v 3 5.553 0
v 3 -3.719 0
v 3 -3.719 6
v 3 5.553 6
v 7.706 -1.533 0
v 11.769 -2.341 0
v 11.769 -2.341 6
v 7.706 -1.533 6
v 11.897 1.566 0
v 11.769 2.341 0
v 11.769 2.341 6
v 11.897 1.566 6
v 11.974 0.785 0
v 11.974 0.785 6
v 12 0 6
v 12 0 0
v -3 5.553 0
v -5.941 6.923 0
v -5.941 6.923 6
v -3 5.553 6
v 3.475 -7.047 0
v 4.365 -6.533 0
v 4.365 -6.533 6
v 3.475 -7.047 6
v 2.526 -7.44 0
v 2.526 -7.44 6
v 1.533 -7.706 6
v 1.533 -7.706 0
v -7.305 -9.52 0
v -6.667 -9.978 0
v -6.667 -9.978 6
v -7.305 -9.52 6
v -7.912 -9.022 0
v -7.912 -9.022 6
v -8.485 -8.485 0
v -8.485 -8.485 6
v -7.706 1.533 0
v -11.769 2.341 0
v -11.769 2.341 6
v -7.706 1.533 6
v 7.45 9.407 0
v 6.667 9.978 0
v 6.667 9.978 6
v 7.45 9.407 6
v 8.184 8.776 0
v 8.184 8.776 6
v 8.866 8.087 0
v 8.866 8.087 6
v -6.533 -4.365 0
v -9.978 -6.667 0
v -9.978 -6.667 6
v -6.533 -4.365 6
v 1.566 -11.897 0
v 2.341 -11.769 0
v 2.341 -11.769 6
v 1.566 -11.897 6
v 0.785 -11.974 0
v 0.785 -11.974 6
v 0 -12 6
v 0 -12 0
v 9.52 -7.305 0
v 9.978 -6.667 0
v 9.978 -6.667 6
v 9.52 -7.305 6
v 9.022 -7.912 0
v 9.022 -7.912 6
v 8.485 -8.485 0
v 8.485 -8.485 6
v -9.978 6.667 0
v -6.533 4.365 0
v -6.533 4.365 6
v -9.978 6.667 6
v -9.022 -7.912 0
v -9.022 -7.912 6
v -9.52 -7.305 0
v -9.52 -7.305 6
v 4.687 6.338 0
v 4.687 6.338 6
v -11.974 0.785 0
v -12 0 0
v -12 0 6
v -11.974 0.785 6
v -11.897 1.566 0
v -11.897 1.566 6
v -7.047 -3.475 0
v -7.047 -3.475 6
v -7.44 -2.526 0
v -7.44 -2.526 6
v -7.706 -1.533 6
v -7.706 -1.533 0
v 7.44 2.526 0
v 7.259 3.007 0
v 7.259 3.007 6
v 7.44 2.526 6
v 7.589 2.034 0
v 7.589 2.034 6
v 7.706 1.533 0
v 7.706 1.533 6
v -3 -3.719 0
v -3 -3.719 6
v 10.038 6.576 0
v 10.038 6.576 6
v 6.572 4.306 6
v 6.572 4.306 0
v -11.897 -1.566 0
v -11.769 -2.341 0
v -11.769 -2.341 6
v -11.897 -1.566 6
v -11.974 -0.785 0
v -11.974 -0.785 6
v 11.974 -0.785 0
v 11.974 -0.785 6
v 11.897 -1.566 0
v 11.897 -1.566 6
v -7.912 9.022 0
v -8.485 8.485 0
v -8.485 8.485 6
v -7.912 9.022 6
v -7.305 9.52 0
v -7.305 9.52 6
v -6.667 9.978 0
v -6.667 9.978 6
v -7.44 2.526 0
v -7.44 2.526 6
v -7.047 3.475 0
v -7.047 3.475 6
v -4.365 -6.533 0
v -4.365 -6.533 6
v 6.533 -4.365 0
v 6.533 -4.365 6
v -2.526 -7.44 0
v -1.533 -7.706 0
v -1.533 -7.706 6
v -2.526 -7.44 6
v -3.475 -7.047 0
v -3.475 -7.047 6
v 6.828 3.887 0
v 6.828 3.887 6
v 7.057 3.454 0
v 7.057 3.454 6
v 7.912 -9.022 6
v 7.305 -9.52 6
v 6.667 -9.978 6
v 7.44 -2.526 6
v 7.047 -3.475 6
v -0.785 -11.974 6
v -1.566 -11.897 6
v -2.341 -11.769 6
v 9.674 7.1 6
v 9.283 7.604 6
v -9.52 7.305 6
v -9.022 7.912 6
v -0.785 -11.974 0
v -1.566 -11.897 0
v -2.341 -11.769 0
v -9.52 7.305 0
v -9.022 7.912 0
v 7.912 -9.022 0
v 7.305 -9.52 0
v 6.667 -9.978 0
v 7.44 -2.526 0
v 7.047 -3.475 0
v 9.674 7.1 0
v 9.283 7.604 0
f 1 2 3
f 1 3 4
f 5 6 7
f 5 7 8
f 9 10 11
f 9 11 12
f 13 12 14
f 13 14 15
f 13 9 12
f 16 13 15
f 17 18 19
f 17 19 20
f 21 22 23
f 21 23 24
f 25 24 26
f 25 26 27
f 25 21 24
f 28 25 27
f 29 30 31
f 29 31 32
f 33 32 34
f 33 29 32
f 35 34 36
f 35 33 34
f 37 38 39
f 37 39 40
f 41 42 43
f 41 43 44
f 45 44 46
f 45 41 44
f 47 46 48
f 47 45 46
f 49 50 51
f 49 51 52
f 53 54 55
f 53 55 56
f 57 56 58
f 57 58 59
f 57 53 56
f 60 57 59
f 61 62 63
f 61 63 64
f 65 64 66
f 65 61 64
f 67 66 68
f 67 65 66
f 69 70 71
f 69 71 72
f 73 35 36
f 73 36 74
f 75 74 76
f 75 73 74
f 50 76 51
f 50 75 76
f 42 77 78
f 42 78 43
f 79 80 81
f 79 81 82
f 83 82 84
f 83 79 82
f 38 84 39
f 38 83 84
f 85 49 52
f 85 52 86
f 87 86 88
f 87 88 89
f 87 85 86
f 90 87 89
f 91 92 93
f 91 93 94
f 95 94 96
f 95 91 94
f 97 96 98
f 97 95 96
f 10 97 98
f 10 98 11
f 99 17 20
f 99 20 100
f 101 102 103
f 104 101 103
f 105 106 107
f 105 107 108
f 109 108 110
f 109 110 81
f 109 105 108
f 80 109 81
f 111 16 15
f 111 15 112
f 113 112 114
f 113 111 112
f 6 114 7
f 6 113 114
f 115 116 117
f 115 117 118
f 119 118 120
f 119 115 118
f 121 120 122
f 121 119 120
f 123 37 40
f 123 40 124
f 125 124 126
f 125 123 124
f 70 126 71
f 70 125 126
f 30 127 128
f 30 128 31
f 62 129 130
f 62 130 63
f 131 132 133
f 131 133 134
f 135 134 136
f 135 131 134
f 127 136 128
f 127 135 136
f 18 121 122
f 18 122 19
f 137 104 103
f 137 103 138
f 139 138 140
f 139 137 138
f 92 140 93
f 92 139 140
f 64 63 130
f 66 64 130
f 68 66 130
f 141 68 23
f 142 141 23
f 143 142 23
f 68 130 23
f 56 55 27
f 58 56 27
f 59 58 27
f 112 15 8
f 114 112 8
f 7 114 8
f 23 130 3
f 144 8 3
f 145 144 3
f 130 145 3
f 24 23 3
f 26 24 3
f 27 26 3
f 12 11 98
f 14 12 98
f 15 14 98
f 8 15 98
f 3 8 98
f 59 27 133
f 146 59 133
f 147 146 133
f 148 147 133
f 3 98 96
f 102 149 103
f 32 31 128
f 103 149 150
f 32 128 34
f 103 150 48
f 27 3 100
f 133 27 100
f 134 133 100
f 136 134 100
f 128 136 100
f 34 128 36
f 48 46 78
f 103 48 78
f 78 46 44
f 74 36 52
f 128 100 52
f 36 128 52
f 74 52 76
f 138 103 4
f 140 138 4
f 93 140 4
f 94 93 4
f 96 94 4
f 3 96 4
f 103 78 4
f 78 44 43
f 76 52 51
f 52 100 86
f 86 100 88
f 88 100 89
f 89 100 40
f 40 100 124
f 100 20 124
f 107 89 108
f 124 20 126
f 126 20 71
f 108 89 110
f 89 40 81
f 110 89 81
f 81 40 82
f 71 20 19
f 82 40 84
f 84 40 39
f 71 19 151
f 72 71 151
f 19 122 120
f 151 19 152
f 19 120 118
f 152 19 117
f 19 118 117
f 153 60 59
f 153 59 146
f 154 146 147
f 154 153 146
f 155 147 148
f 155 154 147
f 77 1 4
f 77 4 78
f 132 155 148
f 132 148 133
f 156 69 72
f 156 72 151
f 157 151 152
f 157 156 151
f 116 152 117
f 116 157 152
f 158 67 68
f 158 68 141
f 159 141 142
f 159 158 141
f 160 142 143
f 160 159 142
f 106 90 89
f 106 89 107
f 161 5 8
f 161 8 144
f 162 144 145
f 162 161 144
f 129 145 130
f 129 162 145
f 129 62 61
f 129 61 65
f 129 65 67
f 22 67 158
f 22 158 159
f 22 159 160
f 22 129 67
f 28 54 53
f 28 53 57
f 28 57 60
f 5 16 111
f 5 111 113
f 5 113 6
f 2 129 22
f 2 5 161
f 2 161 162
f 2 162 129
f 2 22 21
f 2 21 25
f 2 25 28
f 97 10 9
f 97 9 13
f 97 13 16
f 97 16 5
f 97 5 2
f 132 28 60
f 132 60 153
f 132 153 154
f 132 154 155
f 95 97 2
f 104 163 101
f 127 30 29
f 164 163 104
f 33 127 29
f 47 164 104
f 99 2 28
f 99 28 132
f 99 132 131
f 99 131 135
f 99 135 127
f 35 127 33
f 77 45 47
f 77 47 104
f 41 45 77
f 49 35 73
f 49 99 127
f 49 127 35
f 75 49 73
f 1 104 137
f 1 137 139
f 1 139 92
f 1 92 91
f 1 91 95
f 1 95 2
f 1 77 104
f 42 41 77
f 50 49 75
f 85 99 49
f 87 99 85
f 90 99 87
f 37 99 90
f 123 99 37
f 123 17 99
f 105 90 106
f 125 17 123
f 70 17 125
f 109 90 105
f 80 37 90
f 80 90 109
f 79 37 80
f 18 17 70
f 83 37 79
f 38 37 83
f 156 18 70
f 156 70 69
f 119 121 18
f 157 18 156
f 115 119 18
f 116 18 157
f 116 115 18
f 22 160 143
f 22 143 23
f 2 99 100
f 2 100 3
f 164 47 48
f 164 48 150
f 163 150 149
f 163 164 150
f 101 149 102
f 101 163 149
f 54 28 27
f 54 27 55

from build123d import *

# Parameters (mm, degrees)
RESSALTO_EXTRUS_O1_DEPTH = 6


with BuildPart() as part:
    # Esboço1 → Ressalto-extrusão1 (new body)
    with BuildSketch(Plane.XY):
        with BuildLine():
            Line((-3, -3.719131056), (3, -3.719131056))
            Line((3, -3.719131056), (3, 5.552723944))
            Line((3, 5.552723944), (4.686976687, 6.338438926))
            Line((4.686976687, 6.338438926), (6.666842796, 9.977635348))
            ThreePointArc((6.666842796, 9.977635348), (7.823592894, 9.098977648), (8.865699639, 8.08698769))
            ThreePointArc((8.865699639, 8.08698769), (9.481878586, 7.354860874), (10.037762914, 6.575965))
            Line((10.037762914, 6.575965), (6.572308916, 4.305667884))
            ThreePointArc((6.572308916, 4.305667884), (6.946088732, 3.672311498), (7.259013875, 3.006781996))
            ThreePointArc((7.259013875, 3.006781996), (7.518775912, 2.280795738), (7.706128027, 1.532844169))
            Line((7.706128027, 1.532844169), (11.769423365, 2.341083864))
            ThreePointArc((11.769423365, 2.341083864), (11.94221672, 1.176205684), (12, 0))
            ThreePointArc((12, 0), (11.94221672, -1.176205684), (11.769423365, -2.341083864))
            Line((11.769423365, -2.341083864), (7.706128027, -1.532844169))
            ThreePointArc((7.706128027, -1.532844169), (7.259013875, -3.006781996), (6.532939891, -4.365170878))
            Line((6.532939891, -4.365170878), (9.977635348, -6.666842796))
            ThreePointArc((9.977635348, -6.666842796), (9.27612544, -7.61271941), (8.485281374, -8.485281374))
            ThreePointArc((8.485281374, -8.485281374), (7.61271941, -9.27612544), (6.666842796, -9.977635348))
            Line((6.666842796, -9.977635348), (4.365170878, -6.532939891))
            ThreePointArc((4.365170878, -6.532939891), (3.006781996, -7.259013875), (1.532844169, -7.706128027))
            Line((1.532844169, -7.706128027), (2.341083864, -11.769423365))
            ThreePointArc((2.341083864, -11.769423365), (1.176205684, -11.94221672), (0, -12))
            ThreePointArc((0, -12), (-1.176205684, -11.94221672), (-2.341083864, -11.769423365))
            Line((-2.341083864, -11.769423365), (-1.532844169, -7.706128027))
            ThreePointArc((-1.532844169, -7.706128027), (-3.006781996, -7.259013875), (-4.365170878, -6.532939891))
            Line((-4.365170878, -6.532939891), (-6.666842796, -9.977635348))
            ThreePointArc((-6.666842796, -9.977635348), (-7.61271941, -9.27612544), (-8.485281374, -8.485281374))
            ThreePointArc((-8.485281374, -8.485281374), (-9.27612544, -7.61271941), (-9.977635348, -6.666842796))
            Line((-9.977635348, -6.666842796), (-6.532939891, -4.365170878))
            ThreePointArc((-6.532939891, -4.365170878), (-7.259013875, -3.006781996), (-7.706128027, -1.532844169))
            Line((-7.706128027, -1.532844169), (-11.769423365, -2.341083864))
            ThreePointArc((-11.769423365, -2.341083864), (-11.94221672, -1.176205684), (-12, 0))
            ThreePointArc((-12, 0), (-11.94221672, 1.176205684), (-11.769423365, 2.341083864))
            Line((-11.769423365, 2.341083864), (-7.706128027, 1.532844169))
            ThreePointArc((-7.706128027, 1.532844169), (-7.259013875, 3.006781996), (-6.532939891, 4.365170878))
            Line((-6.532939891, 4.365170878), (-9.977635348, 6.666842796))
            ThreePointArc((-9.977635348, 6.666842796), (-9.27612544, 7.61271941), (-8.485281374, 8.485281374))
            ThreePointArc((-8.485281374, 8.485281374), (-7.61271941, 9.27612544), (-6.666842796, 9.977635348))
            Line((-6.666842796, 9.977635348), (-5.941249609, 6.922620695))
            Line((-5.941249609, 6.922620695), (-3, 5.552723944))
            Line((-3, 5.552723944), (-3, -3.719131056))
        make_face()
    extrude(amount=RESSALTO_EXTRUS_O1_DEPTH)


solid = part.part
